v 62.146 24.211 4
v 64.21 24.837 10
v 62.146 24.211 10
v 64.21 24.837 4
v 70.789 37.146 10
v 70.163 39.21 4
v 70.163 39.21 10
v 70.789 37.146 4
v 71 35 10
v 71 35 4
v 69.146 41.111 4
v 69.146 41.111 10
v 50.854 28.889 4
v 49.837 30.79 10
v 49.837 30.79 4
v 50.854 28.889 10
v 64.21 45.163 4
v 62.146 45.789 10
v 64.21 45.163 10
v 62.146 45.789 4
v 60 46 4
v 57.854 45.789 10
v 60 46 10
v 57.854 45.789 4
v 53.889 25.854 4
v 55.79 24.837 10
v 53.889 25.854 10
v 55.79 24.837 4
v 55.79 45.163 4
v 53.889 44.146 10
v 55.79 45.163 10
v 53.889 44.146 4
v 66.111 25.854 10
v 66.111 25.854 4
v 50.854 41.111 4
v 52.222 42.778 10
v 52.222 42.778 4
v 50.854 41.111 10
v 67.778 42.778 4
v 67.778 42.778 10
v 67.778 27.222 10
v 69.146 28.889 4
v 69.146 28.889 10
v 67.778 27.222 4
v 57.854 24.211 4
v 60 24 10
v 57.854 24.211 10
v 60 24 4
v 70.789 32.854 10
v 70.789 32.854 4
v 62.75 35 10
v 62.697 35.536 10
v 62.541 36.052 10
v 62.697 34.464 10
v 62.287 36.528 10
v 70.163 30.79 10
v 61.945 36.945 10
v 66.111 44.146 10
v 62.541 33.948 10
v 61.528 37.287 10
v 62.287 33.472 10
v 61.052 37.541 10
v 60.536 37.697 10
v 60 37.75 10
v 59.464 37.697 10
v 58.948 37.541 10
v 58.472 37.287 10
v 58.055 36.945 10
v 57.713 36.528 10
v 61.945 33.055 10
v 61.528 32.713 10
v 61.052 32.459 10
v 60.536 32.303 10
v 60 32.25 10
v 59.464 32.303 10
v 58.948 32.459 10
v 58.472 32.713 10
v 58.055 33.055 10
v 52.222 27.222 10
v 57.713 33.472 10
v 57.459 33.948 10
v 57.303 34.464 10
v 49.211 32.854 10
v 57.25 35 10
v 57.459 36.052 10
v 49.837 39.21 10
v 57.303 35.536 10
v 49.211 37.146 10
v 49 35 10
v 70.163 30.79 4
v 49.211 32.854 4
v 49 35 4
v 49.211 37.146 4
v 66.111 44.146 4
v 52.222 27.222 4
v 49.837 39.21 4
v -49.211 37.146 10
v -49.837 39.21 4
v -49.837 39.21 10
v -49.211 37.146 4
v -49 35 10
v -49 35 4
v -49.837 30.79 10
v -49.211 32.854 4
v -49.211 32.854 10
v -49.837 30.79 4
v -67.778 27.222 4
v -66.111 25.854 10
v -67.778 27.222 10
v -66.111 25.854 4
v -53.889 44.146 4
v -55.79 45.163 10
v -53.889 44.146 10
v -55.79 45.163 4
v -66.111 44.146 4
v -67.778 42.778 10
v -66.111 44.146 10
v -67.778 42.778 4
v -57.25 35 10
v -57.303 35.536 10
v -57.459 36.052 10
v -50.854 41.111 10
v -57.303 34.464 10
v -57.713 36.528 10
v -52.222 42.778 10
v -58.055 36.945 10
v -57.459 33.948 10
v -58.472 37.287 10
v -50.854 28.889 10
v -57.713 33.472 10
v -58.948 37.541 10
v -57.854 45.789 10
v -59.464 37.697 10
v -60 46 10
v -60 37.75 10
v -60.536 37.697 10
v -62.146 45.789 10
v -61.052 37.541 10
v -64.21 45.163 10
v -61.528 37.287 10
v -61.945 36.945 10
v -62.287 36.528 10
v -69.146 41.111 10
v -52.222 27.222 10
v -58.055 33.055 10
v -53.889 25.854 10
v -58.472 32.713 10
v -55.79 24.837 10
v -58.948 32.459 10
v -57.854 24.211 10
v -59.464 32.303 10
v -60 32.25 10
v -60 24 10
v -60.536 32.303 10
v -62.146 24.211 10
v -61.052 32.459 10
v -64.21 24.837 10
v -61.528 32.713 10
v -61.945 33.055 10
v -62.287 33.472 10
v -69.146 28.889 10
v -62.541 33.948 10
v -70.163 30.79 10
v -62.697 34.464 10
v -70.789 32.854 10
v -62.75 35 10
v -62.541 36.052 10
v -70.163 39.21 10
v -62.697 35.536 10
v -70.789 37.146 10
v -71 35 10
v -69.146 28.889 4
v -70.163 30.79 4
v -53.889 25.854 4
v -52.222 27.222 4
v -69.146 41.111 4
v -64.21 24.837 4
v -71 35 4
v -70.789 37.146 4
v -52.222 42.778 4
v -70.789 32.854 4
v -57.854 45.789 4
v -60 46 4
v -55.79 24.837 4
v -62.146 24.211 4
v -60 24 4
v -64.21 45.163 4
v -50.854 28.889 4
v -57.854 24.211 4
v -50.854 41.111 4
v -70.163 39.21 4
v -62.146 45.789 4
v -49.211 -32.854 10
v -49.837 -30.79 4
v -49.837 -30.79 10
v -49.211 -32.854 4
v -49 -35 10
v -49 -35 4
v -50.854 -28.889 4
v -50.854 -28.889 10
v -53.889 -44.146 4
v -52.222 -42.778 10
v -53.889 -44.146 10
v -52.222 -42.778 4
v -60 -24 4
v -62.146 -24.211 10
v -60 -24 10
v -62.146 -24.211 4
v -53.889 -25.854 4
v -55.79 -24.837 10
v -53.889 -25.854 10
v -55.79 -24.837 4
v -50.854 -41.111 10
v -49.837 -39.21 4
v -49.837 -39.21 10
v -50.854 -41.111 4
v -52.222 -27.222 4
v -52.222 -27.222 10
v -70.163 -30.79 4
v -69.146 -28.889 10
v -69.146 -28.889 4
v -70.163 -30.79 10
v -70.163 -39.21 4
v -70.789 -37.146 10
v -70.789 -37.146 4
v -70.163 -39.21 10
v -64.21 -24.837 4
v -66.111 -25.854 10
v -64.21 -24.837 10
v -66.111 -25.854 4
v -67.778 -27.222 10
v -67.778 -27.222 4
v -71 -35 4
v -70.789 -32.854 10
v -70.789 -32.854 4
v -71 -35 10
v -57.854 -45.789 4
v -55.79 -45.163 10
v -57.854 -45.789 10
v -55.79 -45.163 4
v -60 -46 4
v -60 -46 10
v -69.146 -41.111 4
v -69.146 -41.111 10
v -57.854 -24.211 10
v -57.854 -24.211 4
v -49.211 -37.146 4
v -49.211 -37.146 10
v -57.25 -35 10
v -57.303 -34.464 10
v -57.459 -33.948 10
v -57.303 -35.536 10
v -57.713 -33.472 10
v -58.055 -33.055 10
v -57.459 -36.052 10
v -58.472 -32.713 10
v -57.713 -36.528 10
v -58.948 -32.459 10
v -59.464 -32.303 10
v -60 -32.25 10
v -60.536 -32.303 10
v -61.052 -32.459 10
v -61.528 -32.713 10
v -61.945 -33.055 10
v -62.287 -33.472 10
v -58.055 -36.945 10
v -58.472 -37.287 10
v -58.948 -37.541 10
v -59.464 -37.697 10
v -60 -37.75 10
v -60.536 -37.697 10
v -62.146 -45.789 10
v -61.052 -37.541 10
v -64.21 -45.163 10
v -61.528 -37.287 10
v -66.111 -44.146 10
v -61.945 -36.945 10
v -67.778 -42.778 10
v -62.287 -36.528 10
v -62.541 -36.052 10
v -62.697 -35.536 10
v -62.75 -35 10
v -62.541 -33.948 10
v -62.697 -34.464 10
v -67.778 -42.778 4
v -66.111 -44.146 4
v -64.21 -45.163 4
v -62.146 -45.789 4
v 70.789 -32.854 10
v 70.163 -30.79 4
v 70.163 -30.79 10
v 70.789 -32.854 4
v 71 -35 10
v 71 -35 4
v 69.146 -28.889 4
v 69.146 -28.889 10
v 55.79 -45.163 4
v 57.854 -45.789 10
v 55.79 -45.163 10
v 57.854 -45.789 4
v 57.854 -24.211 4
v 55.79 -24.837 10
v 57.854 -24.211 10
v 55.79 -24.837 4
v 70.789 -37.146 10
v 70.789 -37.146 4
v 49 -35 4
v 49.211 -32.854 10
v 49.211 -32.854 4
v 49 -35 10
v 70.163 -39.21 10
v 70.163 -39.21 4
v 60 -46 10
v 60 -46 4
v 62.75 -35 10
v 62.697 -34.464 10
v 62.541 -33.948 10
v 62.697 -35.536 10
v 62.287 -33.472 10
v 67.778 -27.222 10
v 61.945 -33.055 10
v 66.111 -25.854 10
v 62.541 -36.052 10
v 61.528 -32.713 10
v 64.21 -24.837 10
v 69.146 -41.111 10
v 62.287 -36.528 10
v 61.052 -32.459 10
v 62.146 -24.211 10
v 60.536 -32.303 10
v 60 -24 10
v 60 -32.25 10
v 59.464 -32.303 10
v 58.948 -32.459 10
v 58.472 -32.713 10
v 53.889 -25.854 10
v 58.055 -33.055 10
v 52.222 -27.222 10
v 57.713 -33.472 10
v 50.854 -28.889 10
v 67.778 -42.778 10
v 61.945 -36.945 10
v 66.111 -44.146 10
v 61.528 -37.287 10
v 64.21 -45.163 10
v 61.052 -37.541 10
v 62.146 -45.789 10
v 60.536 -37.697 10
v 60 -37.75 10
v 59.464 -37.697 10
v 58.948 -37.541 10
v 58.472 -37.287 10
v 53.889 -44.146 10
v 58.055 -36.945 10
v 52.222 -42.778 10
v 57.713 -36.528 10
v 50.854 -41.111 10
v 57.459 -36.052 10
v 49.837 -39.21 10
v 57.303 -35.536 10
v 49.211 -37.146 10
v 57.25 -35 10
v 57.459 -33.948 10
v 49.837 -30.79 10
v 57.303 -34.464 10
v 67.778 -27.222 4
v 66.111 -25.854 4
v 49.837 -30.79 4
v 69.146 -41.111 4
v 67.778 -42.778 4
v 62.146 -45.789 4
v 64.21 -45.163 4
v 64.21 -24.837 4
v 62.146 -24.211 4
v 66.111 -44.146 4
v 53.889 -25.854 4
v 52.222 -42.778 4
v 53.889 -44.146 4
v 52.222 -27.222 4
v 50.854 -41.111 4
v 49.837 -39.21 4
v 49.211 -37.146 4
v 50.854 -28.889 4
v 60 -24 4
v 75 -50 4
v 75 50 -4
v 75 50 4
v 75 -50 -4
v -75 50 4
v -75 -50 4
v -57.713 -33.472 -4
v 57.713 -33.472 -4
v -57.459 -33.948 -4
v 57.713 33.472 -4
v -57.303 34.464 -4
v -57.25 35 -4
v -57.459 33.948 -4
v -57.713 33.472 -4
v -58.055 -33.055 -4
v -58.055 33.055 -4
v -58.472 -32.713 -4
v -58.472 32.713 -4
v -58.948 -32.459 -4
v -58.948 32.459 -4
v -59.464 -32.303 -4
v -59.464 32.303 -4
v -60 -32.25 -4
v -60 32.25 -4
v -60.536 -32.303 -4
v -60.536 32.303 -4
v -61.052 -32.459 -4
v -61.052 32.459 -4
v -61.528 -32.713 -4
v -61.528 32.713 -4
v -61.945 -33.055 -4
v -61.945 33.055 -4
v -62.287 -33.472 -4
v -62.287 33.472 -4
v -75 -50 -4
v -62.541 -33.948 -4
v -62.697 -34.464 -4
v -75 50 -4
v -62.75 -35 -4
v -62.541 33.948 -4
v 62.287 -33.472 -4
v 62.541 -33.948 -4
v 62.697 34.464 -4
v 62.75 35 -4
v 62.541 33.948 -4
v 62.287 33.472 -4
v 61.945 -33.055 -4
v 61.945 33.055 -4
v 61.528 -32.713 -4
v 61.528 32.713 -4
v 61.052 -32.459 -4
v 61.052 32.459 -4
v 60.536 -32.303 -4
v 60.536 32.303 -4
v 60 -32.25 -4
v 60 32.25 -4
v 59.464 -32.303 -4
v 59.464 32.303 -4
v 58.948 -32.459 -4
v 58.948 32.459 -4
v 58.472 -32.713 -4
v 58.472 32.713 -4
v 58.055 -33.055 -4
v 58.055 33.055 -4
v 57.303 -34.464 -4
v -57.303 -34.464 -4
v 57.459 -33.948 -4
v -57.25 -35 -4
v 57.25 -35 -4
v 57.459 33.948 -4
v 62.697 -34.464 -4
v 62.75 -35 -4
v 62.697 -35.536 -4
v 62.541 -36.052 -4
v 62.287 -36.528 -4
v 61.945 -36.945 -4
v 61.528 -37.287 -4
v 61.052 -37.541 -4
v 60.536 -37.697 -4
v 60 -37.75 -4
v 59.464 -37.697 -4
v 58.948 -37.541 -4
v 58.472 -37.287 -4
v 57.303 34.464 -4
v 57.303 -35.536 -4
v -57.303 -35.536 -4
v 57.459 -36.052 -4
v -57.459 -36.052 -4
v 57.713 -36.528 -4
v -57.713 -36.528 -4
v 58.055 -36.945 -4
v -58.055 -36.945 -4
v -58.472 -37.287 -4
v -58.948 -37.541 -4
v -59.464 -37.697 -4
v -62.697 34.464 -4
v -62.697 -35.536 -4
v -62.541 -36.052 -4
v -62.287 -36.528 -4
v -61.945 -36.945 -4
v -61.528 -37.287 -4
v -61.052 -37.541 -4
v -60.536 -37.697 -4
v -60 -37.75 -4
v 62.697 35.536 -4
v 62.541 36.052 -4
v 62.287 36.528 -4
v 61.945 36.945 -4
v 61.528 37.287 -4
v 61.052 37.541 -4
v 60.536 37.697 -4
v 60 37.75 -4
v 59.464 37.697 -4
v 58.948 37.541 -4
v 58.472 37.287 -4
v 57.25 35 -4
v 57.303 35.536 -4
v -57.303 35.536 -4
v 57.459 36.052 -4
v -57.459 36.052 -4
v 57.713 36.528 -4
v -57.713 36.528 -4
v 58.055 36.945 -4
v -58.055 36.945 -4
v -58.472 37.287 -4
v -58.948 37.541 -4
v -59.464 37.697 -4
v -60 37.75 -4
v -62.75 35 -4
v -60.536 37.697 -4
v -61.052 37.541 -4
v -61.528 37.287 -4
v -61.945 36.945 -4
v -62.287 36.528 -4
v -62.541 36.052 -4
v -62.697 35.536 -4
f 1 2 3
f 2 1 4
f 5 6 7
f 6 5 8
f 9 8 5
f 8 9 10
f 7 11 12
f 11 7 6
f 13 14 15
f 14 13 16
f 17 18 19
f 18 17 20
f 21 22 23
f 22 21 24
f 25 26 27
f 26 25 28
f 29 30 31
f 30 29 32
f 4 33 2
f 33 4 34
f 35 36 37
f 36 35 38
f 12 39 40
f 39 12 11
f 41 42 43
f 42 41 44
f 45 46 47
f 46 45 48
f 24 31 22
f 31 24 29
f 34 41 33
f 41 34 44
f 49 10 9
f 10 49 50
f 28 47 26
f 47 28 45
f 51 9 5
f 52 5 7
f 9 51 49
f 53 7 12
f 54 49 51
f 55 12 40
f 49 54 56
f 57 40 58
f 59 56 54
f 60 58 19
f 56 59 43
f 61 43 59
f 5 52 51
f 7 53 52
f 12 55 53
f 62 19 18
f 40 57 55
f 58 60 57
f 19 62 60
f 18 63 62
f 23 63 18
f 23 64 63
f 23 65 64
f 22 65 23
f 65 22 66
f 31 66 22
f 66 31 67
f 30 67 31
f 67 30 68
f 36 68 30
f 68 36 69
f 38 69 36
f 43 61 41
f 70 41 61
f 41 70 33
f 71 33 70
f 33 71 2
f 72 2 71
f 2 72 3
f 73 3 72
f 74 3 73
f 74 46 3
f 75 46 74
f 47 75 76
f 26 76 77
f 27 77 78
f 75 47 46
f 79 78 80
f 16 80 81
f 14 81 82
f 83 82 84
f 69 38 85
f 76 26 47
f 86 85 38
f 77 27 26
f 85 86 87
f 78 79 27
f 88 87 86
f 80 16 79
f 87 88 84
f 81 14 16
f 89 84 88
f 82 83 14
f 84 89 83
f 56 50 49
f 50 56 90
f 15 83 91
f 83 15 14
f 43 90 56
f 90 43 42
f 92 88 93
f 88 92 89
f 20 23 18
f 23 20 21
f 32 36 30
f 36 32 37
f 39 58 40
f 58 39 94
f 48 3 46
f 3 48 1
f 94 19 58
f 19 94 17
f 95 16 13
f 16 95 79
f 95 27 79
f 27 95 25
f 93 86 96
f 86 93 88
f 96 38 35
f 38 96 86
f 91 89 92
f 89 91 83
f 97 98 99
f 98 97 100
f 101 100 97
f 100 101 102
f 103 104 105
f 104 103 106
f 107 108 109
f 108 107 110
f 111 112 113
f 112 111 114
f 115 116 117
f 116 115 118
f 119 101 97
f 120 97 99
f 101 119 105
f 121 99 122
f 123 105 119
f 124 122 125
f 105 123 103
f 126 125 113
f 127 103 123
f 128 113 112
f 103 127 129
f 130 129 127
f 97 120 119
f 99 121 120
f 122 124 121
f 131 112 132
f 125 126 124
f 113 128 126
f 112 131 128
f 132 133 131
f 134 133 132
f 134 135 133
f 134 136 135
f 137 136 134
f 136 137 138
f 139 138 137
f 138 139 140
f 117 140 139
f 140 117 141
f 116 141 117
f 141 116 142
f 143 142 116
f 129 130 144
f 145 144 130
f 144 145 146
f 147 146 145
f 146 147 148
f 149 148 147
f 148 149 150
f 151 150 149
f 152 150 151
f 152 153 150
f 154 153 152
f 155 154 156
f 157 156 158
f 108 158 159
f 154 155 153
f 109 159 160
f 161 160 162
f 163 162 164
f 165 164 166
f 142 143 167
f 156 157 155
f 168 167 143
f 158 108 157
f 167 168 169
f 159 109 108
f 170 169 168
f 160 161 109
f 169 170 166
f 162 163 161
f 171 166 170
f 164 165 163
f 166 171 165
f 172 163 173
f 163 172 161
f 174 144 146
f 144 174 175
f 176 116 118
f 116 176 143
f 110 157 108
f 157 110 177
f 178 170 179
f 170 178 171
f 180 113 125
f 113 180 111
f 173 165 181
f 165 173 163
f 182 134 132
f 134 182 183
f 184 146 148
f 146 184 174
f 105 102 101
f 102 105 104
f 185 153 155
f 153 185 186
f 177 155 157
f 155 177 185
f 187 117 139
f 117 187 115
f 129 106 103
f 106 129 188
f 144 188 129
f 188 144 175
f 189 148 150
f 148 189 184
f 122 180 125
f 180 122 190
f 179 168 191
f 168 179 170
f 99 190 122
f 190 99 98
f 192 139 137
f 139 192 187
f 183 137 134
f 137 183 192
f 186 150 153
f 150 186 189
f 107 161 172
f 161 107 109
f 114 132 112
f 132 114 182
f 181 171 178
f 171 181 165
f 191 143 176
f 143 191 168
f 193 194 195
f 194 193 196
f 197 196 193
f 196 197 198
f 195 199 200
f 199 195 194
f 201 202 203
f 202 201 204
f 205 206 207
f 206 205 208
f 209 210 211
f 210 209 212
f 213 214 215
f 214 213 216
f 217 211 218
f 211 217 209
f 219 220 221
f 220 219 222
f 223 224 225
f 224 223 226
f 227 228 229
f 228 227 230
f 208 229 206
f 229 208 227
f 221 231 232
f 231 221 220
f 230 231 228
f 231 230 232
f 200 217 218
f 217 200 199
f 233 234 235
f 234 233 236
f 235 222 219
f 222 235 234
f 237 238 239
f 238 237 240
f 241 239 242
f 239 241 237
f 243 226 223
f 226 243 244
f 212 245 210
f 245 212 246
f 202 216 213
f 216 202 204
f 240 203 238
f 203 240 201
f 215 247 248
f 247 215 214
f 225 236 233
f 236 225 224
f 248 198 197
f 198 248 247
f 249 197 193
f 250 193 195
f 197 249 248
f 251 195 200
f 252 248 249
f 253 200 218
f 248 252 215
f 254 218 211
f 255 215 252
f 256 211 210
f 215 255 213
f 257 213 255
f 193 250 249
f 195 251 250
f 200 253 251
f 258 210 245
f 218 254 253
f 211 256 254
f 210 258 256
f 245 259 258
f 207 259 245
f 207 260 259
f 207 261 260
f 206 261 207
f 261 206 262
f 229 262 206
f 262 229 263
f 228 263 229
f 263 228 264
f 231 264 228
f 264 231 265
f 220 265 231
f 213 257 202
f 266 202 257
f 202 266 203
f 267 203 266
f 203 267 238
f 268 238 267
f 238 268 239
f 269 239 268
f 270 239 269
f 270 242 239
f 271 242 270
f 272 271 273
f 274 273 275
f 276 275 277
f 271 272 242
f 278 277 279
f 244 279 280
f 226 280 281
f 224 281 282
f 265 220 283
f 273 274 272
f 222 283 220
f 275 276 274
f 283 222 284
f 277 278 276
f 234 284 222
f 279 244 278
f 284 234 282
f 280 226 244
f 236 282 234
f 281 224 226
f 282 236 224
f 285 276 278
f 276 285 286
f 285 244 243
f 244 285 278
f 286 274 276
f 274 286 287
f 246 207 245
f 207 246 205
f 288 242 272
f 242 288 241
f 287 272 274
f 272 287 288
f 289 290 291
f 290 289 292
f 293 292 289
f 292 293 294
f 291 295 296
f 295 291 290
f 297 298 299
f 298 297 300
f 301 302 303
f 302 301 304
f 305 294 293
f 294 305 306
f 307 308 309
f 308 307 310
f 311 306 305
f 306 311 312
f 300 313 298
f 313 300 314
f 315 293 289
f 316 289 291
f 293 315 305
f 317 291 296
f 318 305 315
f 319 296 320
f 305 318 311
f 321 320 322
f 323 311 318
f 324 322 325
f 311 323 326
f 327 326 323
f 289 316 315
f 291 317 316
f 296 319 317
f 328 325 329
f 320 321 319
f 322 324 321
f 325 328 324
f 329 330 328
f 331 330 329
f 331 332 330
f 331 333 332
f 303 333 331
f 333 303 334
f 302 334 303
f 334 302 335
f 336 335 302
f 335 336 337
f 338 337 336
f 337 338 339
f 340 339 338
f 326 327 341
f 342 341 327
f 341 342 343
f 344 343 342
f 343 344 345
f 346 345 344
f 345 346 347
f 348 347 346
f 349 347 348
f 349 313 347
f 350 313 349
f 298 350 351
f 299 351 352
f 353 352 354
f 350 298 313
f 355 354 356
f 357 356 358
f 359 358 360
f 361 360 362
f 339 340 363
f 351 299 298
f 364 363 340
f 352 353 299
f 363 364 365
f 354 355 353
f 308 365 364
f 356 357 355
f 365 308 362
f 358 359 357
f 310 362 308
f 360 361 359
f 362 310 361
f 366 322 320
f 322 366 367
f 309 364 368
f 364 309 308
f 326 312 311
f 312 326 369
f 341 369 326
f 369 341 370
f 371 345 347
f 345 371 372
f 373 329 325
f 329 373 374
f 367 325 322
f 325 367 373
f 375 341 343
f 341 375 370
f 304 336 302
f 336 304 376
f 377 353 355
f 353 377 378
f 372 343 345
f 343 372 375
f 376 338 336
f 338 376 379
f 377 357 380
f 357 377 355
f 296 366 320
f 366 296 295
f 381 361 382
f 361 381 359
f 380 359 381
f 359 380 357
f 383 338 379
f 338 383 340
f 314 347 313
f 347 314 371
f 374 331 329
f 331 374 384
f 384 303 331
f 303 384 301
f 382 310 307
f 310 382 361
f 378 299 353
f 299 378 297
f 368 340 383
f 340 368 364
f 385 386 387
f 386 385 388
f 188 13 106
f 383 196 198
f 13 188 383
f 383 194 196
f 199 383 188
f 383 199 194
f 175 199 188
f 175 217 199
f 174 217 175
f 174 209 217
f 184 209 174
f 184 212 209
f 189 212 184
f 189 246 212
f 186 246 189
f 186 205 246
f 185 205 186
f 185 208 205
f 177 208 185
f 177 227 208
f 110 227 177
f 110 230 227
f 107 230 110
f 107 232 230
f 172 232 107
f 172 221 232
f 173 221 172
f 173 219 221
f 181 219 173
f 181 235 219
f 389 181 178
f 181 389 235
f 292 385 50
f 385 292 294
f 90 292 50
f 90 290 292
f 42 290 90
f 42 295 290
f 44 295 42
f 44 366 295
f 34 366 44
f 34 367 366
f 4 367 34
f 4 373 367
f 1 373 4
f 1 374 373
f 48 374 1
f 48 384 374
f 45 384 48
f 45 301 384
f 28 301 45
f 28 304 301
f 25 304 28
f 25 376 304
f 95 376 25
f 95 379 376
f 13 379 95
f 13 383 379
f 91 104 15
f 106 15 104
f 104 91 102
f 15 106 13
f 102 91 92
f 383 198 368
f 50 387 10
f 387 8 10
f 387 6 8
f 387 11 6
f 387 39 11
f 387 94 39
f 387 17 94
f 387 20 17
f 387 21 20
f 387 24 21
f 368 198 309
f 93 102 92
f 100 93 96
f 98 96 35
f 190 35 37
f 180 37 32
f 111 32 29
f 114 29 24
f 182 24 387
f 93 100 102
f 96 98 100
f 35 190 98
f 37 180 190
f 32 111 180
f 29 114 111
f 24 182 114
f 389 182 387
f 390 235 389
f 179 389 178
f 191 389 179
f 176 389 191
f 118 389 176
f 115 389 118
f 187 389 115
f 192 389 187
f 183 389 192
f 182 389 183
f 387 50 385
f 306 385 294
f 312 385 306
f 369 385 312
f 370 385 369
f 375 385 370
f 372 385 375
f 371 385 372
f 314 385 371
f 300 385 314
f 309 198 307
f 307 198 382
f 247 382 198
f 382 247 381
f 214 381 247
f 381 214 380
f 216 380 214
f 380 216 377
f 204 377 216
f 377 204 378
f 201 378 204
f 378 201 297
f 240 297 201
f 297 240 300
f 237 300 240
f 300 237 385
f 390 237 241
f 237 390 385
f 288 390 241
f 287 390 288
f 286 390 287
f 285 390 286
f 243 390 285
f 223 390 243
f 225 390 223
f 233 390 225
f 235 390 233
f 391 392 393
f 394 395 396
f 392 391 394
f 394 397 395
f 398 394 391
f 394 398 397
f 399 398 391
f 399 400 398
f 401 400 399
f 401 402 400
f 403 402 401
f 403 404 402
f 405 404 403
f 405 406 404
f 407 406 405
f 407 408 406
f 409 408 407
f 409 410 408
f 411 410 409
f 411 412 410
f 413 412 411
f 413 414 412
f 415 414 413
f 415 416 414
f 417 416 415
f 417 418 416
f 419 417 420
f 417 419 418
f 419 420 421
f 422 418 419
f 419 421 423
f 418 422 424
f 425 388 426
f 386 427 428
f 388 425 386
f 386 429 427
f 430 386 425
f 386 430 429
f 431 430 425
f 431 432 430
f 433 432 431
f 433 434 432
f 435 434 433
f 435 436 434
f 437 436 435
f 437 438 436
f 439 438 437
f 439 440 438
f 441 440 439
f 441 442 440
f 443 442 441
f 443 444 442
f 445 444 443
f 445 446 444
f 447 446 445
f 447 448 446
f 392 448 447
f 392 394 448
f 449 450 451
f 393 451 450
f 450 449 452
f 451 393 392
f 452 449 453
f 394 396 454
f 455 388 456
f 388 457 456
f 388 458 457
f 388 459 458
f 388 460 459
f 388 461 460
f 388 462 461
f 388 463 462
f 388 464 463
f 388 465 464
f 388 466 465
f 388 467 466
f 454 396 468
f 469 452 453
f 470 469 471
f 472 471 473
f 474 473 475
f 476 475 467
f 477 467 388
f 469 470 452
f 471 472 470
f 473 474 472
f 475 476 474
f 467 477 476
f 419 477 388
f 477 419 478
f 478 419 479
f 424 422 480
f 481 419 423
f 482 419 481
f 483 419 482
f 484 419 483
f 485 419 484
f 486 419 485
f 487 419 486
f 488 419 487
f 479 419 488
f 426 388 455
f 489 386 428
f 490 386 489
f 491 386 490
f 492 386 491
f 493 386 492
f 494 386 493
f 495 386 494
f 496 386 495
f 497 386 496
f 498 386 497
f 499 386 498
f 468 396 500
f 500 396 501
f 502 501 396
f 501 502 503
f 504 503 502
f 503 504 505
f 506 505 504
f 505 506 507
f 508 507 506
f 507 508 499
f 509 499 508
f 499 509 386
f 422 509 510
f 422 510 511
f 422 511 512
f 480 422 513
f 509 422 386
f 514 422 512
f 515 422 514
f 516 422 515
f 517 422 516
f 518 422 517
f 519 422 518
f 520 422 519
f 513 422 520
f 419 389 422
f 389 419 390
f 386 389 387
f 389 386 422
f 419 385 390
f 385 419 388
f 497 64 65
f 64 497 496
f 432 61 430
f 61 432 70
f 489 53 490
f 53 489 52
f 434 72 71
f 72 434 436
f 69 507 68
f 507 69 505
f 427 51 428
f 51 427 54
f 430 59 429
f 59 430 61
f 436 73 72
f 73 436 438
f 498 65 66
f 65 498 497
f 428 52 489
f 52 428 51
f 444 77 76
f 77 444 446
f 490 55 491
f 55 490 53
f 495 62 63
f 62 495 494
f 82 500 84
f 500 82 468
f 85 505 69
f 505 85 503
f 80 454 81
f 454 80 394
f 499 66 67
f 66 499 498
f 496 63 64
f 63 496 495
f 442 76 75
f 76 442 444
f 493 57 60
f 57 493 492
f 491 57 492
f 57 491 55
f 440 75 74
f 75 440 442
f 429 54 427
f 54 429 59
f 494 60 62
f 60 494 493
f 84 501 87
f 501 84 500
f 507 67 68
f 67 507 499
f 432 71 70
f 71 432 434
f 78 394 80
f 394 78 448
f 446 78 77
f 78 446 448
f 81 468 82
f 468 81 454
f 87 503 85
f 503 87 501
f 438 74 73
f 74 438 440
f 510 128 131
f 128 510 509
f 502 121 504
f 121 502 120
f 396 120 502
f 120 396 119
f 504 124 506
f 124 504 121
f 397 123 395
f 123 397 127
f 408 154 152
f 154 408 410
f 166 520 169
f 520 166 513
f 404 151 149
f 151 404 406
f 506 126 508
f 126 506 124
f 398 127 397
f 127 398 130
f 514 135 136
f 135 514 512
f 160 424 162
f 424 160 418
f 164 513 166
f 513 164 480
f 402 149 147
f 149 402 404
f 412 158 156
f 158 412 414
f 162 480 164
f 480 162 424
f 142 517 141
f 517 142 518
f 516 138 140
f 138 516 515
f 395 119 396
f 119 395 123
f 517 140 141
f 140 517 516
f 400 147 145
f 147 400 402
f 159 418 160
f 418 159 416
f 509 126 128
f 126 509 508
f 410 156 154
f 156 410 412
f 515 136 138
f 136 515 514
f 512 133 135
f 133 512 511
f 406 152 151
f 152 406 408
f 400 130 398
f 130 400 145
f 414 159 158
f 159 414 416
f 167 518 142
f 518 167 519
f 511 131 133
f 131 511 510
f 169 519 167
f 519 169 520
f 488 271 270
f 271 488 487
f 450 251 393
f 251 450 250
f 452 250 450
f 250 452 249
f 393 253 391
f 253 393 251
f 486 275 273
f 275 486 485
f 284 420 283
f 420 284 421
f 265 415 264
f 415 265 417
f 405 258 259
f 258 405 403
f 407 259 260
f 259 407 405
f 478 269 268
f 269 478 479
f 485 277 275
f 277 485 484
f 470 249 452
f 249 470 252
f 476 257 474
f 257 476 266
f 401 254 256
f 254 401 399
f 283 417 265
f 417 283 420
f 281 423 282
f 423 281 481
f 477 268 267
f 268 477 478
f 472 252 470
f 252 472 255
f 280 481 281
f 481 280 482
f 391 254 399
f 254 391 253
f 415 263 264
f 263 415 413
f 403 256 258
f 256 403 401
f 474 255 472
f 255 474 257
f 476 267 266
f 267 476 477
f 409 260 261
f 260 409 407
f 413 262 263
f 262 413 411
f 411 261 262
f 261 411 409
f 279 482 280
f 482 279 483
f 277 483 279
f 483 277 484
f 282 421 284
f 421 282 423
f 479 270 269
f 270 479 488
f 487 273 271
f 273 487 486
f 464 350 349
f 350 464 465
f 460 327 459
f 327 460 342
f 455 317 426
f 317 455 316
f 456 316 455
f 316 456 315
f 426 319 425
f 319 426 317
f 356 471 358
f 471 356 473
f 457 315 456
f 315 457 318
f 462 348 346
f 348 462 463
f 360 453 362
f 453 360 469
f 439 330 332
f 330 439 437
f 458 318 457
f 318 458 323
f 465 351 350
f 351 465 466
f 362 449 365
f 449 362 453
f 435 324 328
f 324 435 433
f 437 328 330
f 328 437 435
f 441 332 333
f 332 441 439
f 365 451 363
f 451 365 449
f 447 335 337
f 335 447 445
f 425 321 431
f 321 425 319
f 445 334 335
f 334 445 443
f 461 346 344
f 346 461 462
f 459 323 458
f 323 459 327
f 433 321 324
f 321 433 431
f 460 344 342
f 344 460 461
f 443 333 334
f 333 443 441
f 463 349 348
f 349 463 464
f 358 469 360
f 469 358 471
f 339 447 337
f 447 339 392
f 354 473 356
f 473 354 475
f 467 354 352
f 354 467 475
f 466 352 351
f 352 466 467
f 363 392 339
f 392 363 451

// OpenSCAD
$fn = 32;

// ----------------------------------------------------------------------
// Anchor pads 150 x 100 x 14
// four corner bosses with anchor holes
// ----------------------------------------------------------------------

// --- parameters (mm) ---
plate = [150, 100, 8];  // base plate size (x, y, z)
pads = 4;               // boss count, one per corner
edge = 15;              // boss centre offset from the plate edge
boss_d = 22;            // boss diameter
boss_h = 6;             // boss height above the base plate
hole_d = 5.5;           // hole diameter

// --- derived feature positions (mm) ---
height = plate[2] + boss_h;      // = 14   overall height of the part
corner_x = plate[0] / 2 - edge;  // = 60   boss centre X
corner_y = plate[1] / 2 - edge;  // = 35   boss centre Y
feature_centers = [
  [corner_x, corner_y],
  [-corner_x, corner_y],
  [-corner_x, -corner_y],
  [corner_x, -corner_y]
];   // boss centres, anchor holes are drilled there

// base plate, four bosses standing on it, anchor holes all the way through
difference() {
  union() {
    cube(plate, center = true);
    for (centre = feature_centers)
      translate([centre[0], centre[1], plate[2] / 2 - 1])
        cylinder(d = boss_d, h = boss_h + 1);
  }
  for (centre = feature_centers)
    translate([centre[0], centre[1], -height])
      cylinder(d = hole_d, h = 2 * height + 2);  // through boss and plate
}
